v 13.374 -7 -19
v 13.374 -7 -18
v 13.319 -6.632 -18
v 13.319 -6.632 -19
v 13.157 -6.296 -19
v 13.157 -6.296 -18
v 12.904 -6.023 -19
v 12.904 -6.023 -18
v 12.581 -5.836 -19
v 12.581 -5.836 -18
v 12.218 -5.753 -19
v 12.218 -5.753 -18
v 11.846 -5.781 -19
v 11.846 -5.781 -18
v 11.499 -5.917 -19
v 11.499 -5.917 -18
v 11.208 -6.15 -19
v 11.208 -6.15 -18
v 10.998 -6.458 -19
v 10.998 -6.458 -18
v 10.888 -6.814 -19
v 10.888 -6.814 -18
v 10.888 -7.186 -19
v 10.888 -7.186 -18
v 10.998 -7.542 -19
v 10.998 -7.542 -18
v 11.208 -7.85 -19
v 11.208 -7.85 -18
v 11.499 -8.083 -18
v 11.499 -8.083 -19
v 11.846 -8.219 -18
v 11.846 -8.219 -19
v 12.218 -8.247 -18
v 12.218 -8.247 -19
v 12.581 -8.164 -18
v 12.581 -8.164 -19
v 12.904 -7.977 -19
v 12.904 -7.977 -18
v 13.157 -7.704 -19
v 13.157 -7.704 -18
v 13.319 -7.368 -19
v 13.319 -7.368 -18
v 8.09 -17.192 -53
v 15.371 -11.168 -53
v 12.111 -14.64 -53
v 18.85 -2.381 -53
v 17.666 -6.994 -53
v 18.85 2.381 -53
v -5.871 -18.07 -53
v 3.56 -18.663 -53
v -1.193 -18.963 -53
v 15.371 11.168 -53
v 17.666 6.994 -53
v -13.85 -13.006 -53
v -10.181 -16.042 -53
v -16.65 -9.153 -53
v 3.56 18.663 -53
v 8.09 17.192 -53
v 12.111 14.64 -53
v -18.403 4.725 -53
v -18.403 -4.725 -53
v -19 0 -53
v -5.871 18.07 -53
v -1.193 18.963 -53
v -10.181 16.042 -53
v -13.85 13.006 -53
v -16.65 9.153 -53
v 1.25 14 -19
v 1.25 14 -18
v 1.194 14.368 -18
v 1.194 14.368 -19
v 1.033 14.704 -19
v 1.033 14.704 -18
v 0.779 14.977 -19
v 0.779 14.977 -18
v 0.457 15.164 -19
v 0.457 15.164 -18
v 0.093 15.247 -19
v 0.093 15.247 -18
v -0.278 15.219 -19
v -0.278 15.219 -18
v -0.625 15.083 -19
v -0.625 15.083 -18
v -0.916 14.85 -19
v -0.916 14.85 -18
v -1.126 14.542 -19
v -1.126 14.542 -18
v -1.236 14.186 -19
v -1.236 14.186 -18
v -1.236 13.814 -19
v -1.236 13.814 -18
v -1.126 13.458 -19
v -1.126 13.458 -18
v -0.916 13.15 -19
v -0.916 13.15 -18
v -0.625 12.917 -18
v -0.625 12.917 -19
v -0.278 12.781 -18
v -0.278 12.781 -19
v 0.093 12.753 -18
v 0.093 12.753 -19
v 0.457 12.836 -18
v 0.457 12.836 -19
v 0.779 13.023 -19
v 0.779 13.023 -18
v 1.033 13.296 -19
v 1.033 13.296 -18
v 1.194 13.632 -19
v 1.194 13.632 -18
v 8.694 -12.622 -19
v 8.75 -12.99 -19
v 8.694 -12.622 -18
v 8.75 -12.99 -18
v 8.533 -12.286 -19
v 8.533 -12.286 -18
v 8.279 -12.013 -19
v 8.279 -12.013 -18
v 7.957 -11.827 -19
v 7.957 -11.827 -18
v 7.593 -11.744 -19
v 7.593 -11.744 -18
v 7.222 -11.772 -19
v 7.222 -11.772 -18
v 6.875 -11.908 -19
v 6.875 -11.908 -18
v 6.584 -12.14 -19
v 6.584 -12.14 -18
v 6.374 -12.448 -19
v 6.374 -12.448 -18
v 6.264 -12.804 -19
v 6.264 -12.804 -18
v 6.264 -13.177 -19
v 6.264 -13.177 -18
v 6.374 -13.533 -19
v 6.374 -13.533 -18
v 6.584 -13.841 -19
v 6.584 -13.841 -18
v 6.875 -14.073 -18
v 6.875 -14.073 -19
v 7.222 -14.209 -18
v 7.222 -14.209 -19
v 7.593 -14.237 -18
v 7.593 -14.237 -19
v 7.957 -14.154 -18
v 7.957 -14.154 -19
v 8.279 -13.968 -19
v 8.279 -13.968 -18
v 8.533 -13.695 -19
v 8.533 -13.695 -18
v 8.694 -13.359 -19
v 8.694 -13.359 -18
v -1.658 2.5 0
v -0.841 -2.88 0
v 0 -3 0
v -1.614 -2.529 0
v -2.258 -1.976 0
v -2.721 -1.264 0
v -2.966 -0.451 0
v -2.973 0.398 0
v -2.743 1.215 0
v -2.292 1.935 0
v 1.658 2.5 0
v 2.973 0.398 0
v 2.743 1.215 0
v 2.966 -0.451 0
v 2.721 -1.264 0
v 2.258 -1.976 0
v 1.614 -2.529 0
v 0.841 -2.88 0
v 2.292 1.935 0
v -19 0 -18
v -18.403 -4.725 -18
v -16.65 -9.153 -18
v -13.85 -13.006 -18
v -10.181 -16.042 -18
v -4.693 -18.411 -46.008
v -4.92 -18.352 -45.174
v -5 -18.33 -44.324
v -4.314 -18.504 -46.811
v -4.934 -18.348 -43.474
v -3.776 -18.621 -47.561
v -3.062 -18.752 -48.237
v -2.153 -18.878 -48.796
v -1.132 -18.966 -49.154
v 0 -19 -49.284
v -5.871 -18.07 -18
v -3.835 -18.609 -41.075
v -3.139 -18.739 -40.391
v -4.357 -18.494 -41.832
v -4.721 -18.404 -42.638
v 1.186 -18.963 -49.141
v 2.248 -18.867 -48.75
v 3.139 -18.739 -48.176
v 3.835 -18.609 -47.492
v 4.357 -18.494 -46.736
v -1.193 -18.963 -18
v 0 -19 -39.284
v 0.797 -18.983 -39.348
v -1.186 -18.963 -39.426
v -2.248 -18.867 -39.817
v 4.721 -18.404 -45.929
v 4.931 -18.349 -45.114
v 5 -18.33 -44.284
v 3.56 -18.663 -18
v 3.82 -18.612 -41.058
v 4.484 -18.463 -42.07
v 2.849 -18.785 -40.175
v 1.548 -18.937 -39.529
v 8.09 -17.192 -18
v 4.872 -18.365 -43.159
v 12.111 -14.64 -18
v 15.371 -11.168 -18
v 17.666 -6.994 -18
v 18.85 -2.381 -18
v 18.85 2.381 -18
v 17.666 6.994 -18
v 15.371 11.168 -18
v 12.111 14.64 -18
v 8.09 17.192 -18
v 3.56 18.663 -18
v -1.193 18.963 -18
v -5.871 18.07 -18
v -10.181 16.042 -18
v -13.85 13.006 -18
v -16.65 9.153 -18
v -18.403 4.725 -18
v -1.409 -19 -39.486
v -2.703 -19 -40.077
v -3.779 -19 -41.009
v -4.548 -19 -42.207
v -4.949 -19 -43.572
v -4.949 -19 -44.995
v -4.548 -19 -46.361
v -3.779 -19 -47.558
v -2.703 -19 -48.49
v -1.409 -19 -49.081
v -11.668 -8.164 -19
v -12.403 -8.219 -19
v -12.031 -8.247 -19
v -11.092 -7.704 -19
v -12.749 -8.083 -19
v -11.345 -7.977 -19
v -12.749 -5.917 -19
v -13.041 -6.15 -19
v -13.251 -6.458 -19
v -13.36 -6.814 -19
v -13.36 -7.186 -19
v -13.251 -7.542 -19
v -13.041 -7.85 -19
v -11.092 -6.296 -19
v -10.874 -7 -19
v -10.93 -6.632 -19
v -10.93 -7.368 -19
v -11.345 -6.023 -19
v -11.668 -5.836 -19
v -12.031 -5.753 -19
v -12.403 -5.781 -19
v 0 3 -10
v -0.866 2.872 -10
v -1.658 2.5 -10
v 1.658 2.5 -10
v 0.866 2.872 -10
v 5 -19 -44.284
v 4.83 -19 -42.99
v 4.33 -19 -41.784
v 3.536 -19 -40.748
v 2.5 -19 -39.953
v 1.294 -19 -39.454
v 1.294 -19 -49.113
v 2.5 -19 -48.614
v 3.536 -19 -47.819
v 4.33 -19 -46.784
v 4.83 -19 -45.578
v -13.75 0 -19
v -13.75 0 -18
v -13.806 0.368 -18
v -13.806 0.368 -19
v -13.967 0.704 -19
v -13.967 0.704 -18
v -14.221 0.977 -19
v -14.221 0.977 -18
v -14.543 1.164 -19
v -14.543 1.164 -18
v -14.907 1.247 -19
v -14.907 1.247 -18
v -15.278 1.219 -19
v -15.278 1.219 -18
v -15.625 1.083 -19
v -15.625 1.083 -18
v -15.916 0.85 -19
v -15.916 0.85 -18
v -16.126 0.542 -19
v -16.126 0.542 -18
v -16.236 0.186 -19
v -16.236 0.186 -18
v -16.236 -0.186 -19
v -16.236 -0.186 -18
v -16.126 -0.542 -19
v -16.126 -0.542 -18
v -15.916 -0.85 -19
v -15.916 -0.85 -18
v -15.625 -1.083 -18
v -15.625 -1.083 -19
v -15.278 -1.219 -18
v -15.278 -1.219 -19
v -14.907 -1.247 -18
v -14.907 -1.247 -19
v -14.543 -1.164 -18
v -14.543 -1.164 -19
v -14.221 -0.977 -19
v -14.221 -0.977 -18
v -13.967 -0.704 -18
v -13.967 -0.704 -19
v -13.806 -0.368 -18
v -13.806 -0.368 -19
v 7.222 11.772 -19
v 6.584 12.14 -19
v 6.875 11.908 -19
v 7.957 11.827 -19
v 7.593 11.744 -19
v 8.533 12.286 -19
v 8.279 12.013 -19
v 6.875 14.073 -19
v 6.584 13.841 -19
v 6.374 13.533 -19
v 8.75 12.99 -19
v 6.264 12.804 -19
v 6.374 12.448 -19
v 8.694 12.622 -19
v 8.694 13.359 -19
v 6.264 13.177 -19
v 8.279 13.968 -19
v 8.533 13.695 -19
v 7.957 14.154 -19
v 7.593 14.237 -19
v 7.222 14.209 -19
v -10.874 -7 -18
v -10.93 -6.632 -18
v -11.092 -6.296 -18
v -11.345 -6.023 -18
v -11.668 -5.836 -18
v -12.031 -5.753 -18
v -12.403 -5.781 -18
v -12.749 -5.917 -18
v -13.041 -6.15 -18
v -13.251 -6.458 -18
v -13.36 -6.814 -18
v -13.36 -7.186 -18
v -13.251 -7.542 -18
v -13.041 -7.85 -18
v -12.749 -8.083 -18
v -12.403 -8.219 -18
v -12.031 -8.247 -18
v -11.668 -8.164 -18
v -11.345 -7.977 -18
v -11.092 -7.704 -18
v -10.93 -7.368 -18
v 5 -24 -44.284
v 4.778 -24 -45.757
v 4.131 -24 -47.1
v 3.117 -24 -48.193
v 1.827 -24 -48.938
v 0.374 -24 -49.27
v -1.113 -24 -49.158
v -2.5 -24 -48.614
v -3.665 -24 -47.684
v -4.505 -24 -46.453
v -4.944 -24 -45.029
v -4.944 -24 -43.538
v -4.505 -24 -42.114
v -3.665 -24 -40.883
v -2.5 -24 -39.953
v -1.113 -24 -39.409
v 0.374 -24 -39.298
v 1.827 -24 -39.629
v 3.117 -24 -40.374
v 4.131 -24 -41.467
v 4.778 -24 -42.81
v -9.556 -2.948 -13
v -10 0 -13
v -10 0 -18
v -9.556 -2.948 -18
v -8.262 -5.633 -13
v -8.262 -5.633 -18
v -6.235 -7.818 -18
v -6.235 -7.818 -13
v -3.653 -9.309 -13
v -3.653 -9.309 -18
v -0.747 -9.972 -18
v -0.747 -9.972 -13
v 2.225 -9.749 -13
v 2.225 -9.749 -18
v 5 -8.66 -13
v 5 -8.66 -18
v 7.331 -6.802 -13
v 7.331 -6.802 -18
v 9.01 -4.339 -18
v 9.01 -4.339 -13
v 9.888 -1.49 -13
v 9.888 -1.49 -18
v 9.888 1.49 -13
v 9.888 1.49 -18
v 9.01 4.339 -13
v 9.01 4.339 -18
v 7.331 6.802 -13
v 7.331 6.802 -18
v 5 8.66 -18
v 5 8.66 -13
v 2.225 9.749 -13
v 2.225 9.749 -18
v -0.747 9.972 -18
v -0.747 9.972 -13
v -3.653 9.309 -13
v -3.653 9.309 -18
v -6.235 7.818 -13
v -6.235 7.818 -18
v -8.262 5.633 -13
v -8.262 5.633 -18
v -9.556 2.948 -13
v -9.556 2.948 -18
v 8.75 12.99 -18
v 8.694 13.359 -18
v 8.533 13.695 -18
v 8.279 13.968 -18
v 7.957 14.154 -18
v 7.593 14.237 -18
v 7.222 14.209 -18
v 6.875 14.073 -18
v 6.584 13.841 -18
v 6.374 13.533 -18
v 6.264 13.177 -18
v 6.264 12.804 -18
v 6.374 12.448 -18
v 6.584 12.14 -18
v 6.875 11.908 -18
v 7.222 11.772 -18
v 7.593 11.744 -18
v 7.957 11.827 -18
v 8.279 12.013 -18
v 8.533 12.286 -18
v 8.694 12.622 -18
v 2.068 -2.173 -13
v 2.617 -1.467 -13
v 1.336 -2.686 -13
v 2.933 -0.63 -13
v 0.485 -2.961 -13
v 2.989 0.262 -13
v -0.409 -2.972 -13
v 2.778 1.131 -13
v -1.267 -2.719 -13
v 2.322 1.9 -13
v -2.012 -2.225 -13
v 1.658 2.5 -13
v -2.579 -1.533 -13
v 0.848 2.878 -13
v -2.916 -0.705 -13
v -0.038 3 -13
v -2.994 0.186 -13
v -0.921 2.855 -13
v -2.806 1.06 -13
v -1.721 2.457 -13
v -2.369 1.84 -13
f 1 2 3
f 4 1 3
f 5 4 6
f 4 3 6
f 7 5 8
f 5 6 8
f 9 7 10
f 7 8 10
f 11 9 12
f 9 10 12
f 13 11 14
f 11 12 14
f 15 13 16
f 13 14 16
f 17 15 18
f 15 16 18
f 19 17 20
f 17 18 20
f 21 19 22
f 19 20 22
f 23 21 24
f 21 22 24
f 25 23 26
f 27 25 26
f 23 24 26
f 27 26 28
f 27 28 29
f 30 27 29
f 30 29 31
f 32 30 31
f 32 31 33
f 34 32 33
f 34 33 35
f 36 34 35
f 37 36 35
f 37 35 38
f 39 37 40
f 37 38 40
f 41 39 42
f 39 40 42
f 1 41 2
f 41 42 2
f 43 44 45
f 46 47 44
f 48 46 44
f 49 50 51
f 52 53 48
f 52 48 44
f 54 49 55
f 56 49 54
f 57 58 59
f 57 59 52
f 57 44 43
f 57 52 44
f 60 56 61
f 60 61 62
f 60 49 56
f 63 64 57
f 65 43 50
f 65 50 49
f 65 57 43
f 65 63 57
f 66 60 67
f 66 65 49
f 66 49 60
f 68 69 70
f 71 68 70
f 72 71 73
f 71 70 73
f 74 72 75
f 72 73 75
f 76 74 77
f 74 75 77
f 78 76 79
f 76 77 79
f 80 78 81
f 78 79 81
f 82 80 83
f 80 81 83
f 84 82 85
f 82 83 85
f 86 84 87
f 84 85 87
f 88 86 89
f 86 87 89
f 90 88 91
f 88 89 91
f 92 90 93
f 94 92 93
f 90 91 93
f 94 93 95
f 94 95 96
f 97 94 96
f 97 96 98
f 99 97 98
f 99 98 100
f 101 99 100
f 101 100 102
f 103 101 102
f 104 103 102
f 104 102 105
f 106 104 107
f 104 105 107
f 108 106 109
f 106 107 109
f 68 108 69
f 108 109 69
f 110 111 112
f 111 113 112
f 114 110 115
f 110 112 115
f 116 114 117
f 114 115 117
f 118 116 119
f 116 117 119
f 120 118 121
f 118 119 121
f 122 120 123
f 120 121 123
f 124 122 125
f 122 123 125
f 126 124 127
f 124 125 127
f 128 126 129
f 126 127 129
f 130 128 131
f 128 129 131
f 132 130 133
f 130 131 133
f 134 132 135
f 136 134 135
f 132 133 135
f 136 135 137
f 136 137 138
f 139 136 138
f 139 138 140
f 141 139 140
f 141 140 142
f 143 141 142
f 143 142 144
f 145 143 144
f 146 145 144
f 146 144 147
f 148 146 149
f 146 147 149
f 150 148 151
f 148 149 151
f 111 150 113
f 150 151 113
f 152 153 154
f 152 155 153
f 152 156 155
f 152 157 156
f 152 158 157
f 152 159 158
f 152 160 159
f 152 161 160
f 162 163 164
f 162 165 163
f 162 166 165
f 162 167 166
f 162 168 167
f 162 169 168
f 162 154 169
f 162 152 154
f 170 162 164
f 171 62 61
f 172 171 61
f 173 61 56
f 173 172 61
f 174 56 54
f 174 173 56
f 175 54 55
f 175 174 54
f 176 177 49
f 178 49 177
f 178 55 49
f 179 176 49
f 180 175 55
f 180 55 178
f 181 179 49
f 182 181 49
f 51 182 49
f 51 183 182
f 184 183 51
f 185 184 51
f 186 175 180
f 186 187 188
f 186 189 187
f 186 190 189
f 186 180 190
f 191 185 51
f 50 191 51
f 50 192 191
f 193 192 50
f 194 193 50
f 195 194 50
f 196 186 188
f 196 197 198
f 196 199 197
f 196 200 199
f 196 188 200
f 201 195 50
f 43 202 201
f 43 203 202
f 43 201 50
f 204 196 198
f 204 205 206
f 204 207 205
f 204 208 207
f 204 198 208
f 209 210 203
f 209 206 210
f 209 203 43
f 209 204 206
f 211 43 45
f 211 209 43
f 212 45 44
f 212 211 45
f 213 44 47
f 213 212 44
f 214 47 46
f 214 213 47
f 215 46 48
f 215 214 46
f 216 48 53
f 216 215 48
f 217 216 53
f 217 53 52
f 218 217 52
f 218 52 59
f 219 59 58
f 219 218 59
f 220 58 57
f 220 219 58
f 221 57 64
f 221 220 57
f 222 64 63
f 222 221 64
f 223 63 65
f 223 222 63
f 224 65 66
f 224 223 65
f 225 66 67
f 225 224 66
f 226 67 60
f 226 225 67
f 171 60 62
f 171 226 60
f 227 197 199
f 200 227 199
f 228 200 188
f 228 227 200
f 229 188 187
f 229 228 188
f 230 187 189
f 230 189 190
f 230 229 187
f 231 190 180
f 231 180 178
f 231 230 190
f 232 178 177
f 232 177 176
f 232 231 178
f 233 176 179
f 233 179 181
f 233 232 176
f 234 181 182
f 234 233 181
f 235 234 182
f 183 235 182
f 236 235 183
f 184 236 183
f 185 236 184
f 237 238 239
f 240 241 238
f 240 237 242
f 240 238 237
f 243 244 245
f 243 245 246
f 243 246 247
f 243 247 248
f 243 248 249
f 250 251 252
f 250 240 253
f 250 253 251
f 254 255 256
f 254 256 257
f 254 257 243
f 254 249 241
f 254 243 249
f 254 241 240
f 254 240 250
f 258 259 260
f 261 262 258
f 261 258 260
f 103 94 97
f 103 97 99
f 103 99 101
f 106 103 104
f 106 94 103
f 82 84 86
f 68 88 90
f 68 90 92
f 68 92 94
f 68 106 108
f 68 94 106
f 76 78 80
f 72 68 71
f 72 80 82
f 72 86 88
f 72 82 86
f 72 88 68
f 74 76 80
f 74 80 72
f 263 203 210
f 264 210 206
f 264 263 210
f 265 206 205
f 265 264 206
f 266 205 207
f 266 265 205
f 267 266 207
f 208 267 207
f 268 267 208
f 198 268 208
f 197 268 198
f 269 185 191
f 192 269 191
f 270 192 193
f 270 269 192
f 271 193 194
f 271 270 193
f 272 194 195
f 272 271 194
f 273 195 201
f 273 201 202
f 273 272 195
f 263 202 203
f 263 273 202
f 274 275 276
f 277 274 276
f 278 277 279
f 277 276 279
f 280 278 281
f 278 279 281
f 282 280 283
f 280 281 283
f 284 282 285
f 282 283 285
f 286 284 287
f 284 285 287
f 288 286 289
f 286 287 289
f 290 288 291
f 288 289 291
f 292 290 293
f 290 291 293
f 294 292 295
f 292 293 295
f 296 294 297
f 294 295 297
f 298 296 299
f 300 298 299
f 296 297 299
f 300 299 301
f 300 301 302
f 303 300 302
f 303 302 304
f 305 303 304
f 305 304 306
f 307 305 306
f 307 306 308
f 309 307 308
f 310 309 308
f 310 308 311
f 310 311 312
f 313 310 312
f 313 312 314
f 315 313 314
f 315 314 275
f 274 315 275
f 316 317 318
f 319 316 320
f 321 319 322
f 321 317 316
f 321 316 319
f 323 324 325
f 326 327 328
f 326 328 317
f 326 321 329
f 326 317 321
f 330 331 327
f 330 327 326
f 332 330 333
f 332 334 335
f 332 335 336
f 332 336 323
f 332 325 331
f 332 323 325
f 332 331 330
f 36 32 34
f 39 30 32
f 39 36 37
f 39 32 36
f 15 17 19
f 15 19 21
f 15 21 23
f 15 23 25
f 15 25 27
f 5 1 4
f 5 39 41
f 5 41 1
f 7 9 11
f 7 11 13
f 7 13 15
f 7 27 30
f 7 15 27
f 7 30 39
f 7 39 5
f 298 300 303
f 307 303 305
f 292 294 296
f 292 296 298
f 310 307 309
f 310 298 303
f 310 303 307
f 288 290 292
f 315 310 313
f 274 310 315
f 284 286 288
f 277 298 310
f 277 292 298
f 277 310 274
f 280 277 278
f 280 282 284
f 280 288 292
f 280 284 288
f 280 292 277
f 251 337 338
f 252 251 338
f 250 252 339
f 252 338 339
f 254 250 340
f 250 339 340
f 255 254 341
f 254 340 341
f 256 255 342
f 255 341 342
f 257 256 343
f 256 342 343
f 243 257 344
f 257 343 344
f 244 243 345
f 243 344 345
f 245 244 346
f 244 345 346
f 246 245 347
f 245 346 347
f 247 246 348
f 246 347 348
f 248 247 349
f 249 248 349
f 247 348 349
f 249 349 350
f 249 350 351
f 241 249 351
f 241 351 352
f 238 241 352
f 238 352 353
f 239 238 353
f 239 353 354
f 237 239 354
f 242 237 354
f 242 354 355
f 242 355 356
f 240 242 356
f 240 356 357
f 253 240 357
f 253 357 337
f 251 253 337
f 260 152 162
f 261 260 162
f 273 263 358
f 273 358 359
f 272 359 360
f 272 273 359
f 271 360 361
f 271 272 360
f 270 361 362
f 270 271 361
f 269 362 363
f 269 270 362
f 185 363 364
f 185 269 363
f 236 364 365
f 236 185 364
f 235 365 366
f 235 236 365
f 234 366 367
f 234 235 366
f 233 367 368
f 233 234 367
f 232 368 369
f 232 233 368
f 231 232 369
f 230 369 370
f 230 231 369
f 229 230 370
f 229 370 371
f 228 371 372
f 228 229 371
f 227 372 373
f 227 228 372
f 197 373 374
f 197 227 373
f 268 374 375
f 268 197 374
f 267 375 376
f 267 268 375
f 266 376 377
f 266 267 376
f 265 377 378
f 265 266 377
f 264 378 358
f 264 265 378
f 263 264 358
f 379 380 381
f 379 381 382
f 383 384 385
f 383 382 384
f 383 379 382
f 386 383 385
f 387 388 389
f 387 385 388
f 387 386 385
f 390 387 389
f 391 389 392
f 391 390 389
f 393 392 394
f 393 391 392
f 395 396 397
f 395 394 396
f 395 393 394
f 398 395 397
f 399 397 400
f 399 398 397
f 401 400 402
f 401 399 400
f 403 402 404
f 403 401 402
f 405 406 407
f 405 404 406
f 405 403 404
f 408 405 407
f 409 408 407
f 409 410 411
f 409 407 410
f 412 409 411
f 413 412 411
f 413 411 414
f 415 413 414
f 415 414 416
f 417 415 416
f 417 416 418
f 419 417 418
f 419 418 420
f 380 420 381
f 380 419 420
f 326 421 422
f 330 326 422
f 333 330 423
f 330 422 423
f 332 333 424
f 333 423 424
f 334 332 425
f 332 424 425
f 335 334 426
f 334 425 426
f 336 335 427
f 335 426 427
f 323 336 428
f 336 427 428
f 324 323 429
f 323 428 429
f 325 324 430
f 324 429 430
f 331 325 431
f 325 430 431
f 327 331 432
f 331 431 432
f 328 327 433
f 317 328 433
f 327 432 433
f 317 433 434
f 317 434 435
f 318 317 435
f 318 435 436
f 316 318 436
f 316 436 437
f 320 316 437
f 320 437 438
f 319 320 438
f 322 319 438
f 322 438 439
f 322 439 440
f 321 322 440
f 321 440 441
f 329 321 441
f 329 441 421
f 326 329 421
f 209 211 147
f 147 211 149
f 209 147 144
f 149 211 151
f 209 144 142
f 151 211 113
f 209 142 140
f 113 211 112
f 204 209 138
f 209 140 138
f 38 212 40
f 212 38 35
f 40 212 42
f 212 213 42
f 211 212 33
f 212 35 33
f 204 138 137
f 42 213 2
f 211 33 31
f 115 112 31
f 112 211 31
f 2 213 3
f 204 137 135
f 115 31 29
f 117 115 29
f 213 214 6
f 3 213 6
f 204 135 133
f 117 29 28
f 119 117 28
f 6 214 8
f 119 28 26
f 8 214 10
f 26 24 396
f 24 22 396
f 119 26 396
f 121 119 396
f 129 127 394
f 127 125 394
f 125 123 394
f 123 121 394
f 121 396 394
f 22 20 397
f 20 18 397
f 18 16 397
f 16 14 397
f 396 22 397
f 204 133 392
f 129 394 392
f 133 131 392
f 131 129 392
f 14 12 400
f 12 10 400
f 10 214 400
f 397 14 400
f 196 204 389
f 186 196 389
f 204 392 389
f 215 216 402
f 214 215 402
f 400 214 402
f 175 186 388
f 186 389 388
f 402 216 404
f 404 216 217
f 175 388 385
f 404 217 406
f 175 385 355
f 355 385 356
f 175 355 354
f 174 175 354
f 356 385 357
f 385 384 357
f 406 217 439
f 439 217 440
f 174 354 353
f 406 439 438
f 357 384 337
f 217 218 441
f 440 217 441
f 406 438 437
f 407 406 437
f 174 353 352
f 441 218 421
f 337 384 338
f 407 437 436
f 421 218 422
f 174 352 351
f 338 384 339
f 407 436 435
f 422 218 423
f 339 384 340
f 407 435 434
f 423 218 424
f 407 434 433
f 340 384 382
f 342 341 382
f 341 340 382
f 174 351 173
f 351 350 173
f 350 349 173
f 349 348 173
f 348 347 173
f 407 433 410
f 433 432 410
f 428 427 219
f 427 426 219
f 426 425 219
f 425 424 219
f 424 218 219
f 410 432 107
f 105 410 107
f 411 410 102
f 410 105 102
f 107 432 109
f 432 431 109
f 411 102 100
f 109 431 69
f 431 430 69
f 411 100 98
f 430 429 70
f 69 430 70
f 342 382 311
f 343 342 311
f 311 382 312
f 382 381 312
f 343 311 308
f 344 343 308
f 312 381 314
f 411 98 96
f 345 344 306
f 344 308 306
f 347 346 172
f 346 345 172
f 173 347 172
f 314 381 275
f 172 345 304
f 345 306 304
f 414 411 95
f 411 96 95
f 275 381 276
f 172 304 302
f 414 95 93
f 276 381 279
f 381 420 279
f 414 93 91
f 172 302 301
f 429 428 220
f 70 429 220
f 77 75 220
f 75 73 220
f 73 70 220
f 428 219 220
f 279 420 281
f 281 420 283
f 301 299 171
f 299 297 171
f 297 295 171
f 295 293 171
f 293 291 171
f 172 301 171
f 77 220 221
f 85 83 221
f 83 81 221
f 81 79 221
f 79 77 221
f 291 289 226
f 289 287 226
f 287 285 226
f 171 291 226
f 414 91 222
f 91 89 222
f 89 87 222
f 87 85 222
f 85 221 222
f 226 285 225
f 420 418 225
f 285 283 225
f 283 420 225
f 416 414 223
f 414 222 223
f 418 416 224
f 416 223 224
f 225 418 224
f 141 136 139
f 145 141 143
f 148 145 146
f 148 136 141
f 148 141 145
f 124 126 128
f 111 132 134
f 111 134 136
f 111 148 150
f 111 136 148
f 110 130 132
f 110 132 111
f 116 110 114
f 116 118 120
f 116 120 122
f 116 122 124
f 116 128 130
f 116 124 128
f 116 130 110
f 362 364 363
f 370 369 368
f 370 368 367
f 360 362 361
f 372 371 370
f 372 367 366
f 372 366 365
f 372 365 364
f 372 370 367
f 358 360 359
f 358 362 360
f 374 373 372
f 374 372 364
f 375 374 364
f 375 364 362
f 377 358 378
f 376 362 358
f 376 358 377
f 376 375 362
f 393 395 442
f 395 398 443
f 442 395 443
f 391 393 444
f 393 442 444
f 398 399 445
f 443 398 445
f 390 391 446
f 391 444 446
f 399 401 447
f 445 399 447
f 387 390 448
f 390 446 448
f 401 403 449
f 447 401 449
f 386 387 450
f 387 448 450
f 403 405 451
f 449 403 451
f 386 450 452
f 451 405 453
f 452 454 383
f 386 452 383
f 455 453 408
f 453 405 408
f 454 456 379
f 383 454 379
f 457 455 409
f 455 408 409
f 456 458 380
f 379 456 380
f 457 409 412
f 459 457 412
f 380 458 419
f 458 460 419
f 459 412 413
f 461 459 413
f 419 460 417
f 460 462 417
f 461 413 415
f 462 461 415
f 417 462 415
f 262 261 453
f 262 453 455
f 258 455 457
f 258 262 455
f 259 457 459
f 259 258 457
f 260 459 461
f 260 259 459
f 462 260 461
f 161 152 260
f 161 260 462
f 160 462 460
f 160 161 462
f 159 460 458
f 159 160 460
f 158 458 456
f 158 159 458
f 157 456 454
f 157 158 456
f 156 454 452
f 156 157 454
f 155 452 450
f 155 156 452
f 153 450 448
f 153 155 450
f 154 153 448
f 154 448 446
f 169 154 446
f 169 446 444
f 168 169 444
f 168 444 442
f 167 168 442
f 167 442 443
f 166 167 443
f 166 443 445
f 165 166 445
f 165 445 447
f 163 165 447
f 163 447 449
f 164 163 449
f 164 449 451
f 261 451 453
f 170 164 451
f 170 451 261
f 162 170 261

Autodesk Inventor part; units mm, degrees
ref_plane "YZ Plane" through (0, 0, 0) normal (1, 0, 0) x (0, 1, 0)
ref_plane "XZ Plane" through (0, 0, 0) normal (0, 1, 0) x (-1, 0, 0)
sketch "Sketch1" plane through (0, 0, 0) normal (0, 0, 1) x (1, 0, 0)
  circle A0 centre (0, 0) radius 3
  line L0 (0, 3) -> (0, 3)
  line L1 (-1.6583, 2.5) -> (1.6583, 2.5)
  line L2 (1.6583, 2.5) -> (1.6583, 4.0802)
  line L3 (-1.6583, 4.0802) -> (-1.6583, 2.5)
  point P0 (0, 2.5)
  dimension "d0" = 6
  dimension "d3" = 2.5
  dimension "d4" = 0
  dimension "d5" = 0.5
extrude "Extrusion1" add sketch "Sketch1" against normal blind 13 contours A0 L1 picked at (0.1141, 0.6732)
sketch "Sketch2" plane through (0, 0, -13) normal (0, 0, -1) x (-1, 0, 0)
  circle A0 centre (0, 0) radius 10
  dimension "d8" = 20
extrude "Extrusion2" add sketch "Sketch2" along normal blind 5
sketch "Sketch3" plane through (0, 0, -18) normal (0, 0, -1) x (-1, 0, 0)
  circle A0 centre (0, 0) radius 19
  dimension "d11" = 38
extrude "Extrusion3" add sketch "Sketch3" along normal blind 35
sketch "Sketch4" plane through (0, 0, -18) normal (0, 0, 1) x (1, 0, 0)
  arc A0 (-1.6583, 2.5) -> (1.6583, 2.5) centre (0, 0) ccw projected
  circle A1 centre (0, 0) radius 14
  circle A2 centre (0, 14) radius 1.25
  circle A3 centre (-12.1244, -7) radius 1.25
  circle A4 centre (12.1244, -7) radius 1.25
  circle A5 centre (0, 0) radius 15
  circle A6 centre (7.5, 12.9904) radius 1.25
  circle A7 centre (-15, 0) radius 1.25
  circle A8 centre (7.5, -12.9904) radius 1.25
  dimension "d14" = 28
  dimension "d20" = 30
  dimension "d15" = 2.5
  dimension "d18" = 360
  dimension "d21" = 2.5
  dimension "d22" = 30
  dimension "d25" = 360
extrude "Extrusion4" cut sketch "Sketch4" against normal blind 1 contours A6 A1 | A1 A6 A5 | A4 A5 A1 | A1 A4 | A5 A6 | A4 A5 | A2 A1 | A1 A2 A5 | A8 A5 A1 | A1 A8 | A5 A2 | A8 A5 | A7 A1 | A1 A7 A5 | A3 A5 A1 | A1 A3 | A5 A7 | A3 A5
sketch "Sketch5" plane through (0, 0, -18) normal (0, 0, 1) x (1, 0, 0)
  circle A0 centre (0, 0) radius 19 projected
  point P0 (0, -19)
ref_plane "Work Plane1" through (0, -19, -18) normal (0, -1, 0) x (1, 0, 0)
sketch "Sketch6" plane through (0, -19, -18) normal (0, -1, 0) x (1, 0, 0)
  circle A0 centre (0, -26.2836) radius 5
  point P0 (0, 18)
  dimension "d29" = 10
extrude "Extrusion5" add sketch "Sketch6" along normal blind 5 and the other way blind 0.7
sketch "Sketch7" plane through (0, 0, -13) normal (0, 0, 1) x (1, 0, 0)
  circle A0 centre (0, 0) radius 3
extrude "Extrusion6" add sketch "Sketch7" along normal blind 3
equation "\"BendRadius\" = Thickness"
equation "\"BendReliefWidth\" = Thickness"
equation "\"BendReliefDepth\" = 0.5 * Thickness"
equation "\"CornerReliefSize\" = 4 * Thickness"
equation "\"MinimumRemnant\" = 2 * Thickness"
equation "\"TransitionRadius\" = BendRadius"
equation "\"JacobiRadiusSize\" = BendRadius"
equation "\"GapSize\" = Thickness"
equation "\"Thickness\" = 0.5"
properties part number "Optical Encoder"
